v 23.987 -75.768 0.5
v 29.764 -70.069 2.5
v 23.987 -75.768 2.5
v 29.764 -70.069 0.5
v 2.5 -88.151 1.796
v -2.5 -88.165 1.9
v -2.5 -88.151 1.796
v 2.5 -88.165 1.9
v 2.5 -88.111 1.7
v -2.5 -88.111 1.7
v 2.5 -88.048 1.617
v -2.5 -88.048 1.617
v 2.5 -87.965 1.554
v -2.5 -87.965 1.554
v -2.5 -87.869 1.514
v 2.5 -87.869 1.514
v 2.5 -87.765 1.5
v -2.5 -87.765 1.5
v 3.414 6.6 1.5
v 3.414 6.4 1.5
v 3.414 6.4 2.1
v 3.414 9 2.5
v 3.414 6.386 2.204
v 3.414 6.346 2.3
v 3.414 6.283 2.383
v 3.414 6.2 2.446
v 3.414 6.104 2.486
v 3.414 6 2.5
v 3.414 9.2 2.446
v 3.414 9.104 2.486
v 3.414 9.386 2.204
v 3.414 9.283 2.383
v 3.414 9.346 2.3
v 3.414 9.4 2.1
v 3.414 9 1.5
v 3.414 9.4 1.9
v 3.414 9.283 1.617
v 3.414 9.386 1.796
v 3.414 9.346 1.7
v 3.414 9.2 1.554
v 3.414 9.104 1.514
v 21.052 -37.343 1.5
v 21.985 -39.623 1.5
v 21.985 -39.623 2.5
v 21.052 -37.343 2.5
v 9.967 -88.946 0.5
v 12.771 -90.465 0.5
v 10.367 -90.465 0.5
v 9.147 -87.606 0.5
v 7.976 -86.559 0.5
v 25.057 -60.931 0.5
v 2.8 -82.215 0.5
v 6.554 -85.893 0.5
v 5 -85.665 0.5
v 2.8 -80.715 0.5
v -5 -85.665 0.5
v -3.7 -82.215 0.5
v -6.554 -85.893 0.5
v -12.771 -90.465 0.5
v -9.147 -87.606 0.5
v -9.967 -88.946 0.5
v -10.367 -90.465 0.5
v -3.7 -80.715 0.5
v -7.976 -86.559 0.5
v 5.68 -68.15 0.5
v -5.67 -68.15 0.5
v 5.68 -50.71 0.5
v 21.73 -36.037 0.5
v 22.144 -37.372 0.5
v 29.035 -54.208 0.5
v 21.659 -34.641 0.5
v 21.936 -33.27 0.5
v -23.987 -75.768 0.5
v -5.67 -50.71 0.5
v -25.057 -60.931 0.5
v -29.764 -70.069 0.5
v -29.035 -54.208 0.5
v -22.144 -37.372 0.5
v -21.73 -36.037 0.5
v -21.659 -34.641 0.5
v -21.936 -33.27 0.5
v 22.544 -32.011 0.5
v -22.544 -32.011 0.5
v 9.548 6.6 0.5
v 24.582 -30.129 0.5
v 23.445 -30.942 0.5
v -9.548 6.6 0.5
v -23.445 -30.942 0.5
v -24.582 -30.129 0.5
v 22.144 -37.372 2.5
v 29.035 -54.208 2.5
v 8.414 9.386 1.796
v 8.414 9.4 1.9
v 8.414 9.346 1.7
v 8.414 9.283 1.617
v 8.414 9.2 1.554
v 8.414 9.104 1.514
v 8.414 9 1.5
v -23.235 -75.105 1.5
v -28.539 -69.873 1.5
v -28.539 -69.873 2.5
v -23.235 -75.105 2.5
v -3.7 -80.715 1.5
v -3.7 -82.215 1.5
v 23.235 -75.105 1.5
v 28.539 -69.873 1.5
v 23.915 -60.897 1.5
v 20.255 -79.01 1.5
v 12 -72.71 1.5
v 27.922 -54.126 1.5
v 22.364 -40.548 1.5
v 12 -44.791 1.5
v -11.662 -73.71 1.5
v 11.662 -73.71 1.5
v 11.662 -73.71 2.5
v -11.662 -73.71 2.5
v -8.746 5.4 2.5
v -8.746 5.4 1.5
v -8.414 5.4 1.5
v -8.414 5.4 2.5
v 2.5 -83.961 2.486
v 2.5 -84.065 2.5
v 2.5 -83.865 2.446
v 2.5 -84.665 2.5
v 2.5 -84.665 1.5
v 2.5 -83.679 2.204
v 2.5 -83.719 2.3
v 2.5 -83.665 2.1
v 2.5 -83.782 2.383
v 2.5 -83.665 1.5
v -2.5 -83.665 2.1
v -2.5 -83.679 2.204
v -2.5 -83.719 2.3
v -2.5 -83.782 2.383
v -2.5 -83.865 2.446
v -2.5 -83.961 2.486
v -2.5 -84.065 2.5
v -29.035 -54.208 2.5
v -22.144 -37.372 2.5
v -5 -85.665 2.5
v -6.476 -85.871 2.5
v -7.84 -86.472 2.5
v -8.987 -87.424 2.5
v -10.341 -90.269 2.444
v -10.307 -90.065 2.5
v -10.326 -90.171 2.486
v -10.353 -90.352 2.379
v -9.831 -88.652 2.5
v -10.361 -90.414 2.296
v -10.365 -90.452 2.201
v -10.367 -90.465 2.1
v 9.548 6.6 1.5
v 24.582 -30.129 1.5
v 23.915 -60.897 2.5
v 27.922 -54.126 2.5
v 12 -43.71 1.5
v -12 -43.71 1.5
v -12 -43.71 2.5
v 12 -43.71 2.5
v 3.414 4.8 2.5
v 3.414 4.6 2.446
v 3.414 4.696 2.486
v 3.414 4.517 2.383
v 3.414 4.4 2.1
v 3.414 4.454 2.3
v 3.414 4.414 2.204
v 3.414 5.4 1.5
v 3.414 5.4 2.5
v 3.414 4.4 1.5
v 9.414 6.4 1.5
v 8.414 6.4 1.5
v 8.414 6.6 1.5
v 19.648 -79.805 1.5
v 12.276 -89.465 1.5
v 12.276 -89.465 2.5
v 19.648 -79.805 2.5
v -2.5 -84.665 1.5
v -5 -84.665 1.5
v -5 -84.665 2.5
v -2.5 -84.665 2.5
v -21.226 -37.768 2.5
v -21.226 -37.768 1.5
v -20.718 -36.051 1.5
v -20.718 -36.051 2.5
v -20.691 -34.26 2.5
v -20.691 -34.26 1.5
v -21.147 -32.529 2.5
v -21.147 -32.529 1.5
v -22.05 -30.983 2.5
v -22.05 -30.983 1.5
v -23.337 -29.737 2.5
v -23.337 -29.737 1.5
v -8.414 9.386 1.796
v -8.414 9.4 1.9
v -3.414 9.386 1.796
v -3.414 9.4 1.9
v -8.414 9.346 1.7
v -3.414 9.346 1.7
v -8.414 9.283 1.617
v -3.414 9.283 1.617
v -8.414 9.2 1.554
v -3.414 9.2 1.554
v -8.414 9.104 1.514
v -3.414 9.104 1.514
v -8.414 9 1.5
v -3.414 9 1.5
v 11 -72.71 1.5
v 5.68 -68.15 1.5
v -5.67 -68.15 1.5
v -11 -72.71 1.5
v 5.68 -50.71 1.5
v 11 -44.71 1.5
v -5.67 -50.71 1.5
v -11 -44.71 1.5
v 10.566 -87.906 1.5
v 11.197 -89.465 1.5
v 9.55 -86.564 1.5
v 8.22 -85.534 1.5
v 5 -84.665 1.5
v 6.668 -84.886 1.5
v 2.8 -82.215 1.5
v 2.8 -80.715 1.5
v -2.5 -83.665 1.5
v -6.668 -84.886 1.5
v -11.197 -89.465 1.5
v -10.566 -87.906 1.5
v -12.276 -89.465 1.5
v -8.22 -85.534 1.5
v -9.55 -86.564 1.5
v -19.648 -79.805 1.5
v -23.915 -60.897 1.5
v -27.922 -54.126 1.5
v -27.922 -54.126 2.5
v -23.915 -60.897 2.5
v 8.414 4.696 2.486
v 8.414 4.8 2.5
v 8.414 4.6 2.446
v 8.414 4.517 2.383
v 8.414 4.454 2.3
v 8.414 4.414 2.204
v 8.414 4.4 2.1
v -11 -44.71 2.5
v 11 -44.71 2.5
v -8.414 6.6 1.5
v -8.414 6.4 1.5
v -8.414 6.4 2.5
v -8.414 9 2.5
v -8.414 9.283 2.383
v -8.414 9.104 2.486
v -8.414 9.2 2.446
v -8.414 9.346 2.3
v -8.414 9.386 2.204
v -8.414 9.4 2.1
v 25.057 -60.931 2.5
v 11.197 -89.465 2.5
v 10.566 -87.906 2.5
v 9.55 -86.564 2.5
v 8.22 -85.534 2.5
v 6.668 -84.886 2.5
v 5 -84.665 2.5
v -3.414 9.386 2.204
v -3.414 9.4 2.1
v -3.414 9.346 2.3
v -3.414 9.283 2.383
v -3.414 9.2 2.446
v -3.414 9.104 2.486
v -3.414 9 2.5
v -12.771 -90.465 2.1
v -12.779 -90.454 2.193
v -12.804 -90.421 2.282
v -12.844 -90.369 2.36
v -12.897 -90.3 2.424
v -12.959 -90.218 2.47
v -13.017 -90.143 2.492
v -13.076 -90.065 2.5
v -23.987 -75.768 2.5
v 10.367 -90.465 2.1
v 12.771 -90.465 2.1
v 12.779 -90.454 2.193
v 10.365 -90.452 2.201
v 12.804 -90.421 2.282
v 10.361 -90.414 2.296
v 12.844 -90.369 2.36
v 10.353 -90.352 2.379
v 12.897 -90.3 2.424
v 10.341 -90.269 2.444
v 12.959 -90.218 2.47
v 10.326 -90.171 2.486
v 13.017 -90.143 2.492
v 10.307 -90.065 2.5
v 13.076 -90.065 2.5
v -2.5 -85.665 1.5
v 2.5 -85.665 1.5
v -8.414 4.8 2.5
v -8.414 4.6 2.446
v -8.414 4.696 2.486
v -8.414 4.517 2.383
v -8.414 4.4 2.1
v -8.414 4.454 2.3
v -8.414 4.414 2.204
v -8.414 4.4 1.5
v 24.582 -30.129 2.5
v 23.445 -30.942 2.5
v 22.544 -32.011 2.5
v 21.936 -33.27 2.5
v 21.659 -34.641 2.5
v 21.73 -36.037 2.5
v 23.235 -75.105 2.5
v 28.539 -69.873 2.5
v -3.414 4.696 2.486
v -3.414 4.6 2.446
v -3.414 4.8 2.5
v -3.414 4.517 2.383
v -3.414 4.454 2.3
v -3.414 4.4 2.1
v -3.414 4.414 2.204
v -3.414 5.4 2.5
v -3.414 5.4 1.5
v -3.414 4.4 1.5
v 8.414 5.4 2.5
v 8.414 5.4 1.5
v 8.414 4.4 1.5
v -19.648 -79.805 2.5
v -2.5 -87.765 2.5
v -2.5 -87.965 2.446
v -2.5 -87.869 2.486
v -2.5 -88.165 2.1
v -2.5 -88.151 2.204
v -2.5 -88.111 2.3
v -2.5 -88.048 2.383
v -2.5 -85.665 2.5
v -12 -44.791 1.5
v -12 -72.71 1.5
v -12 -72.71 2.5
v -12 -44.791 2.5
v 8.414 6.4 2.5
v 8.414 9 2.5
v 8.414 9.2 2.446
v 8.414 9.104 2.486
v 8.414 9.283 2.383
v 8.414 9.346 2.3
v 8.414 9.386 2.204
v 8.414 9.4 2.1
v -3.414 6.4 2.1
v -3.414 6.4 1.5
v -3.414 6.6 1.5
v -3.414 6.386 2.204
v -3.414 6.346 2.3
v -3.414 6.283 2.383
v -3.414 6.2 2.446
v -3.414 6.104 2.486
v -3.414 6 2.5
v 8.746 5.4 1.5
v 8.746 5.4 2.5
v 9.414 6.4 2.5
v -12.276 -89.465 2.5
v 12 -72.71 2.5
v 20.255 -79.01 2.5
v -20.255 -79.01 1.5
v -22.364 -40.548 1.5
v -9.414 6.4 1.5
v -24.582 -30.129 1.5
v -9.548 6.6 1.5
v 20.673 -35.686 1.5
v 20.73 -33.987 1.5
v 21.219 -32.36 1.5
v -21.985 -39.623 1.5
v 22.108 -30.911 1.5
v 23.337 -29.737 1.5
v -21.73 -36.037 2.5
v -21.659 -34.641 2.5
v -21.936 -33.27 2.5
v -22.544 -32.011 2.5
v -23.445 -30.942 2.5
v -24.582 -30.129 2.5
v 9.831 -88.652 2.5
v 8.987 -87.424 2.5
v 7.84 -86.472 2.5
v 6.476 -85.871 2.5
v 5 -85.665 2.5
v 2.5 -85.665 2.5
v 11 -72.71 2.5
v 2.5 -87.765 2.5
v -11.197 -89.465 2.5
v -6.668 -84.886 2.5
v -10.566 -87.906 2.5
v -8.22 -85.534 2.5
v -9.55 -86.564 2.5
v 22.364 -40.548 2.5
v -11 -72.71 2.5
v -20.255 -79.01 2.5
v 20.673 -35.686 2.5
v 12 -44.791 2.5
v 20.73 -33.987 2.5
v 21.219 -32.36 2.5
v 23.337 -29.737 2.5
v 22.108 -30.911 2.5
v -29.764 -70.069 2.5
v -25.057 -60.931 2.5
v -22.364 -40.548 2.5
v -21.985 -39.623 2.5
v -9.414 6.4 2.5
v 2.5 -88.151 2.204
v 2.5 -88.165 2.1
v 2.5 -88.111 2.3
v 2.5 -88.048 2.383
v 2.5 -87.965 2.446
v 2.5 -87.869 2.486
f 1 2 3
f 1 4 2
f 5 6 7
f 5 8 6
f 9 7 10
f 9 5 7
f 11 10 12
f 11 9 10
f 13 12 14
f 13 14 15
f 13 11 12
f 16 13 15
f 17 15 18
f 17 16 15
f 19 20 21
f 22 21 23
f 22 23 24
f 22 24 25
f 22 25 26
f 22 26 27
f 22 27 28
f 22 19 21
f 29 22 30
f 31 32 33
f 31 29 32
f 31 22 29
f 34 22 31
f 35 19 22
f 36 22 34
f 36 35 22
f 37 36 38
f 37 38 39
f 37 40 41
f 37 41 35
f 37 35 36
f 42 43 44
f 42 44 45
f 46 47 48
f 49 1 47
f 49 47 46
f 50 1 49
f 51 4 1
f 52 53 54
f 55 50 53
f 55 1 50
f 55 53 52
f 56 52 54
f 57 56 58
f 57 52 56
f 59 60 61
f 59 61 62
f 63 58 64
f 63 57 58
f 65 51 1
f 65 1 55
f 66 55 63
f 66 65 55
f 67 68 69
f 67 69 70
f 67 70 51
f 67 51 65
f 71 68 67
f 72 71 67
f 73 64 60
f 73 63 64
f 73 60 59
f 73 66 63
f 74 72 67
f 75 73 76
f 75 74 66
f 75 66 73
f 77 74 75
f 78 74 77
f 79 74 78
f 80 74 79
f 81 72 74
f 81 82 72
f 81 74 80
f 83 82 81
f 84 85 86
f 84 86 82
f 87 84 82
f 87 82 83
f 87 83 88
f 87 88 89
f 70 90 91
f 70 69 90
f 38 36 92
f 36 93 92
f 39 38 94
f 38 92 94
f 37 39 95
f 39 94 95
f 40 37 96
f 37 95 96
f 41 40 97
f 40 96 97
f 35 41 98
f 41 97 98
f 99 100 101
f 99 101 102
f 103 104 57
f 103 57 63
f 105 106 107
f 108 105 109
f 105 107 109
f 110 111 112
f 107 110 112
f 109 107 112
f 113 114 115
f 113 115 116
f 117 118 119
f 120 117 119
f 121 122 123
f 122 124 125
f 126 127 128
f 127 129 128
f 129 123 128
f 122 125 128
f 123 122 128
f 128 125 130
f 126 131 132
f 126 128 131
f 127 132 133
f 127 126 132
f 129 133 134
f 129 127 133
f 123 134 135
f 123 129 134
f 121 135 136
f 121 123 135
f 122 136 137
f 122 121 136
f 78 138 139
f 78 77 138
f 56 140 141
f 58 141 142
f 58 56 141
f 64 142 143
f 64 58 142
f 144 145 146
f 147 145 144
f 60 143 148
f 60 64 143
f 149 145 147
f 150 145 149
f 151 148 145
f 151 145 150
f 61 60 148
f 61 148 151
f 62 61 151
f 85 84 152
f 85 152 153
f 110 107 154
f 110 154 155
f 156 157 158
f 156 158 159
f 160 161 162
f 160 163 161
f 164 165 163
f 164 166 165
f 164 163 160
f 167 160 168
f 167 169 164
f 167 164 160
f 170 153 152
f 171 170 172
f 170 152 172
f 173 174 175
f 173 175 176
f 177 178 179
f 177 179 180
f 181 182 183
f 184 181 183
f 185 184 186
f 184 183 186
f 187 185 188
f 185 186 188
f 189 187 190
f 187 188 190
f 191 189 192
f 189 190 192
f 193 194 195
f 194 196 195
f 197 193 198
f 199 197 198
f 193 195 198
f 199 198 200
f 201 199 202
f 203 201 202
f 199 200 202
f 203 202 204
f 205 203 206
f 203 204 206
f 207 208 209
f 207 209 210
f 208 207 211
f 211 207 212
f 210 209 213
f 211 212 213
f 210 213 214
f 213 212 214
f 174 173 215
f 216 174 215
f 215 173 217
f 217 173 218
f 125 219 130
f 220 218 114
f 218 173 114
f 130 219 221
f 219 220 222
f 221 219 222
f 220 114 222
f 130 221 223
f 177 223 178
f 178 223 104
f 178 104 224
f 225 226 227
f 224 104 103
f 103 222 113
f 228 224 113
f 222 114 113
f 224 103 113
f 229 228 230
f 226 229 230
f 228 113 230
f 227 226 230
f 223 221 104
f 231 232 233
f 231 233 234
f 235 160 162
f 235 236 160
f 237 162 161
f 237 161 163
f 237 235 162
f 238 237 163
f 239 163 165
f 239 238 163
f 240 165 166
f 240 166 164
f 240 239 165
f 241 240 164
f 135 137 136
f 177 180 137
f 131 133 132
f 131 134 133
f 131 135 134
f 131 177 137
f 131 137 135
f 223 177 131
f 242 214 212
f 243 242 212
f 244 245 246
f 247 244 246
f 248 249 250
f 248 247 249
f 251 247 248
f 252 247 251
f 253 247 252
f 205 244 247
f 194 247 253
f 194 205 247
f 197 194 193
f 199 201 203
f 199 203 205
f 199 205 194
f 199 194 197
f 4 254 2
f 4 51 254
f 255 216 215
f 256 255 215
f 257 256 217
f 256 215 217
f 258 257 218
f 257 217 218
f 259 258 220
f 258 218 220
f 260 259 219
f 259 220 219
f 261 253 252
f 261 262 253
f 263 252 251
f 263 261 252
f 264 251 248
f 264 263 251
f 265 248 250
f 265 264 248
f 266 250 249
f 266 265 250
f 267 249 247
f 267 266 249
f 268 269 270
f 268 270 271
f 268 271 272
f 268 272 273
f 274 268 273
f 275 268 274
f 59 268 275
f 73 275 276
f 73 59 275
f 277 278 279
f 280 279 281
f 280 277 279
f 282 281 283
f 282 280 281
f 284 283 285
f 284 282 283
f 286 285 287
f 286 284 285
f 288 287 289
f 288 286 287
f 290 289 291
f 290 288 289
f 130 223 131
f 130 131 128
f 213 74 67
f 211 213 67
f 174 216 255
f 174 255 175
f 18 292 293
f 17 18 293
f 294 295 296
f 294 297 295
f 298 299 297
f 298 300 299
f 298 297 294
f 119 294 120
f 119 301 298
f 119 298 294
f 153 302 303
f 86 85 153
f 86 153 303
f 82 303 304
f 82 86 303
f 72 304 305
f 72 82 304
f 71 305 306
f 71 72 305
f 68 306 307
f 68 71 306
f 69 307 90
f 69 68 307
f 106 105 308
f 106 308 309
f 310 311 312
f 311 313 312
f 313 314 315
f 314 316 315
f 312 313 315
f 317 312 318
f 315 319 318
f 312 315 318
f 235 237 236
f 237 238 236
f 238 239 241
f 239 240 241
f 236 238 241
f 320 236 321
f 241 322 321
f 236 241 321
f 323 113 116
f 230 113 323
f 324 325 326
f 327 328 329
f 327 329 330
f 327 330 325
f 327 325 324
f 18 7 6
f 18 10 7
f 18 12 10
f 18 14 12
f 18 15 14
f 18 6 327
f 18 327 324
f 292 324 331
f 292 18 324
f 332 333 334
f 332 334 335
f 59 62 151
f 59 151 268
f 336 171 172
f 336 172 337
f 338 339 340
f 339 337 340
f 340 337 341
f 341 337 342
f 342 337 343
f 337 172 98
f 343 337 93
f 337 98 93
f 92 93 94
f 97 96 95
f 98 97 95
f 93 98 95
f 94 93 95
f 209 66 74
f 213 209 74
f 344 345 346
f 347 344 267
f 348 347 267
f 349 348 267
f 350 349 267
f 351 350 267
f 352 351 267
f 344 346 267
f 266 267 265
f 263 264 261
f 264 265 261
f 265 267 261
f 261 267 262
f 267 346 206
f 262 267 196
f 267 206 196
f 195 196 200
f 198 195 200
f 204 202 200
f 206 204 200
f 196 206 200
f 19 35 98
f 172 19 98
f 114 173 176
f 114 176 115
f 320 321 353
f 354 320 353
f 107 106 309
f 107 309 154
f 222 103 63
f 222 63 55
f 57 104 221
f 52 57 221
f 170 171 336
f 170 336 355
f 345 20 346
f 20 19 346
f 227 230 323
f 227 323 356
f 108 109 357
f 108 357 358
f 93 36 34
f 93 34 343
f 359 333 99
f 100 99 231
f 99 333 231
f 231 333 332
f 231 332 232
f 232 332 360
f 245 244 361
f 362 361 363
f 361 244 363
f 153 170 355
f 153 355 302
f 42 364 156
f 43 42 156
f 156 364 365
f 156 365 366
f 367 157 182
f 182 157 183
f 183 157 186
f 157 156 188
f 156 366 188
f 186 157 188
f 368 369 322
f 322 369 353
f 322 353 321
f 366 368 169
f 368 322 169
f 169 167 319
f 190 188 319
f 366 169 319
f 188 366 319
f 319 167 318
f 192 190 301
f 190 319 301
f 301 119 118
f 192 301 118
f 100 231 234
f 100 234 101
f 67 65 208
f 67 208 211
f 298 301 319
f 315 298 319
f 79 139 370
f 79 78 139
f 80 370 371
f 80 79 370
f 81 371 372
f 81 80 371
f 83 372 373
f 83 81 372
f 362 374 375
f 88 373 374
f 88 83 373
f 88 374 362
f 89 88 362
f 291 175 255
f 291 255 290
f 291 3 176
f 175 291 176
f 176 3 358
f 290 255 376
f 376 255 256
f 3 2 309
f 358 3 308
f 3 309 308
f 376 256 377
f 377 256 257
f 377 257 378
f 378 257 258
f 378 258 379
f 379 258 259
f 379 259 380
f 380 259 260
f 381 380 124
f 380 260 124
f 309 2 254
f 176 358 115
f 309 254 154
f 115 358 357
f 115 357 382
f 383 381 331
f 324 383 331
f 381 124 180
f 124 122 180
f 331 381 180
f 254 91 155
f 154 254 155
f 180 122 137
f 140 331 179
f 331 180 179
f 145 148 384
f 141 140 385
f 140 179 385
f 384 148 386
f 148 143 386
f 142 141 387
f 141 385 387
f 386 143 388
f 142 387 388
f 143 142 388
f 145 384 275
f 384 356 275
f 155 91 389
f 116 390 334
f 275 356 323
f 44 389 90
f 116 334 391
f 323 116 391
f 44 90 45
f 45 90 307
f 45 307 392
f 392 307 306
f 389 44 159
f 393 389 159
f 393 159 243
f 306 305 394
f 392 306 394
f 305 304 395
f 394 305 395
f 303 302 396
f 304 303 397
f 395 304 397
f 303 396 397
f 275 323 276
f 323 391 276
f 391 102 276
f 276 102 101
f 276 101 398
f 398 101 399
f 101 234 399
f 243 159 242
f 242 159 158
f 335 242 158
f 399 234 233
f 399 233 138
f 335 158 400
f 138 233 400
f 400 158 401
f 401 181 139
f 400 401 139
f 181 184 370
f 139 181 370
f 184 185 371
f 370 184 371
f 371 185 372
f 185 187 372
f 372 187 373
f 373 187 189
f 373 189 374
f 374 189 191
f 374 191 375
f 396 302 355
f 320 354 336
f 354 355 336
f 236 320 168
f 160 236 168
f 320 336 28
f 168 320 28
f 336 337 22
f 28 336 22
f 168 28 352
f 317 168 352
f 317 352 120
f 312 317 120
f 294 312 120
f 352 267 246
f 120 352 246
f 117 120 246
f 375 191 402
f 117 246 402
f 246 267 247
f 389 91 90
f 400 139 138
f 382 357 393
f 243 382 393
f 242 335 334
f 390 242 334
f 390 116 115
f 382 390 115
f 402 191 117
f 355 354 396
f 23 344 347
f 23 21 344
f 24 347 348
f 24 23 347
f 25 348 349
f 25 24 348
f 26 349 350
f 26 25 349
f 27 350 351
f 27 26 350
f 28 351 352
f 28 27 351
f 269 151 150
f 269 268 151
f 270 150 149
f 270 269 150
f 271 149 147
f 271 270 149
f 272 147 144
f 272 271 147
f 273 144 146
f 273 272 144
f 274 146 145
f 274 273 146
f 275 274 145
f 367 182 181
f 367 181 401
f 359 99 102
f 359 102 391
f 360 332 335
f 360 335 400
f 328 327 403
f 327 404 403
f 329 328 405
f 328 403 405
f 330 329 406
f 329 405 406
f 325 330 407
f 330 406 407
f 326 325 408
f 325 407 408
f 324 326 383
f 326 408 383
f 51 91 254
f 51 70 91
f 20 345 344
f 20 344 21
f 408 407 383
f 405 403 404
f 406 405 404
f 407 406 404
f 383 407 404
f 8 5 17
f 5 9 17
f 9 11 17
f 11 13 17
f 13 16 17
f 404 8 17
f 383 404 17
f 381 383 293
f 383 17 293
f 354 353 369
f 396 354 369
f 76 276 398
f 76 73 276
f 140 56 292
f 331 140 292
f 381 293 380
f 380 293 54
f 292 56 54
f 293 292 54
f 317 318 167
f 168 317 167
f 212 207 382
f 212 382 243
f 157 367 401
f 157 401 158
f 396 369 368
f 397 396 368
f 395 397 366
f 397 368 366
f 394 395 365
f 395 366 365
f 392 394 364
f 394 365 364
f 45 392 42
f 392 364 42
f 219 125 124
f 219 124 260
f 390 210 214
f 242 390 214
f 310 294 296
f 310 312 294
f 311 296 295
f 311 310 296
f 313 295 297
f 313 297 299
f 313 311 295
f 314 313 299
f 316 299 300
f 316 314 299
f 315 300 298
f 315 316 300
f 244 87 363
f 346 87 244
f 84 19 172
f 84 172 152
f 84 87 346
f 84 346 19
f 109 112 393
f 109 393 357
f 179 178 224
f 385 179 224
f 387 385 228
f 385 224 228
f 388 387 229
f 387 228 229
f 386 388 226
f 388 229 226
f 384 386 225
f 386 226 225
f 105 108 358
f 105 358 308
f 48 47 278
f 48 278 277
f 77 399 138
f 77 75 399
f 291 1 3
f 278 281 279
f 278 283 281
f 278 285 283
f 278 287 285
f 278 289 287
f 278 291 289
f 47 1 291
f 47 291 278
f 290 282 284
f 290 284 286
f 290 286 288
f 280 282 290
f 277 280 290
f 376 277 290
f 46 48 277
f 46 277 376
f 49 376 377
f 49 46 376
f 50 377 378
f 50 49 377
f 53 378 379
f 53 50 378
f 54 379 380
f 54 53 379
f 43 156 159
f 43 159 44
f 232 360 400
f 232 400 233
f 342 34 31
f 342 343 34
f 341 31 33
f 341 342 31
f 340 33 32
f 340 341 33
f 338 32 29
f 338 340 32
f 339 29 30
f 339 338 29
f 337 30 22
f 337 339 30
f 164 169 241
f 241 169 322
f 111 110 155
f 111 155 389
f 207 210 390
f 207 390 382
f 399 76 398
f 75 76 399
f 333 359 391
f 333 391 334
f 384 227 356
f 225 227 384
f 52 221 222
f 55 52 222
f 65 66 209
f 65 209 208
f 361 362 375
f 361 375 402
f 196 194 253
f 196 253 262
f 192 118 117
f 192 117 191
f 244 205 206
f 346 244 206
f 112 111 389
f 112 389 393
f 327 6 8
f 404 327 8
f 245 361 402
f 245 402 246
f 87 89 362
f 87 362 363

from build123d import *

# Parameters (mm, degrees)
SKETCH070_W     = 11.35
SKETCH070_H     = 17.44
PAD008_DEPTH    = 1
SKETCH071_W     = 5
SKETCH071_H     = 5
SKETCH071_H_2   = 4.5
PAD009_DEPTH    = 1
SKETCH077_W     = 6.5
SKETCH077_H     = 1.5
POCKET030_DEPTH = 5
SKETCH090_W     = 22
SKETCH090_H     = 28
PAD021_DEPTH    = 1
FILLET016_R     = 0.4


with BuildPart() as part:
    # Sketch070 → Pad008 (new body)
    with BuildSketch(Plane.XY):
        with BuildLine():
            Line((-9.548198, 6.6), (9.548198, 6.6))
            Line((9.548198, 6.6), (24.582245, -30.129227))
            ThreePointArc((24.582245, -30.129227), (21.935707, -33.270294), (22.144365, -37.372358))
            Line((29.035486, -54.207849), (22.144365, -37.372358))
            Line((25.057074, -60.930809), (29.035486, -54.207849))
            Line((29.76445, -70.068592), (25.057074, -60.930809))
            Line((23.9869, -75.767923), (29.76445, -70.068592))
            Line((12.771037, -90.465016), (23.9869, -75.767923))
            Line((10.366563, -90.465016), (12.771037, -90.465016))
            ThreePointArc((10.366563, -90.465016), (8.6, -87.040094), (5, -85.665016))
            Line((-5, -85.665016), (5, -85.665016))
            ThreePointArc((-5, -85.665016), (-8.6, -87.040094), (-10.366563, -90.465016))
            Line((-12.771037, -90.465016), (-10.366563, -90.465016))
            Line((-23.9869, -75.767923), (-12.771037, -90.465016))
            Line((-29.76445, -70.068592), (-23.9869, -75.767923))
            Line((-25.057074, -60.930809), (-29.76445, -70.068592))
            Line((-29.035486, -54.207849), (-25.057074, -60.930809))
            Line((-22.144365, -37.372358), (-29.035486, -54.207849))
            ThreePointArc((-22.144365, -37.372358), (-21.935707, -33.270294), (-24.582245, -30.129227))
            Line((-24.582245, -30.129227), (-9.548198, 6.6))
        make_face()
        with Locations((0.005, -59.43)):
            Rectangle(SKETCH070_W, SKETCH070_H, mode=Mode.SUBTRACT)
    extrude(amount=PAD008_DEPTH)

    # Sketch071 (on Face26 of Pad008) → Pad009 (join)
    with BuildSketch(Plane.XY.offset(1)):
        with Locations((-5.913956, 6.9)):
            Rectangle(SKETCH071_W, SKETCH071_H)
        with Locations((5.913956, 6.9)):
            Rectangle(SKETCH071_W, SKETCH071_H)
        with Locations((0, -85.915016)):
            Rectangle(SKETCH071_W, SKETCH071_H_2)
    extrude(amount=PAD009_DEPTH)

    # Sketch077 (on Face5 of Pad009) → Pocket030 (cut)
    with BuildSketch(Plane.XY.offset(1)):
        with Locations((-0.45, -81.465016)):
            Rectangle(SKETCH077_W, SKETCH077_H)
    extrude(amount=-POCKET030_DEPTH, mode=Mode.SUBTRACT)

    # Sketch090 (on Face5 of Pocket030) → Pad021 (join)
    with BuildSketch(Plane.XY.offset(1)):
        with BuildLine():
            Line((-9.413956, 6.4), (9.413956, 6.4))
            Line((9.413956, 6.4), (24.582245, -30.129227))
            ThreePointArc((24.582245, -30.129227), (21.935707, -33.270294), (22.144365, -37.372358))
            Line((22.144365, -37.372358), (29.035486, -54.207849))
            Line((29.035486, -54.207849), (25.057074, -60.930809))
            Line((25.057074, -60.930809), (29.76445, -70.068592))
            Line((29.76445, -70.068592), (23.9869, -75.767923))
            Line((23.9869, -75.767923), (12.771037, -90.465016))
            Line((12.771037, -90.465016), (10.366563, -90.465016))
            ThreePointArc((10.366563, -90.465016), (8.6, -87.040094), (5, -85.665016))
            Line((-5, -85.665016), (5, -85.665016))
            ThreePointArc((-5, -85.665016), (-8.6, -87.040094), (-10.366563, -90.465016))
            Line((-10.366563, -90.465016), (-12.771037, -90.465016))
            Line((-12.771037, -90.465016), (-23.9869, -75.767923))
            Line((-23.9869, -75.767923), (-29.76445, -70.068592))
            Line((-29.76445, -70.068592), (-25.057074, -60.930809))
            Line((-25.057074, -60.930809), (-29.035486, -54.207849))
            Line((-29.035486, -54.207849), (-22.144365, -37.372358))
            ThreePointArc((-22.144365, -37.372358), (-21.935707, -33.270294), (-24.582245, -30.129227))
            Line((-24.582245, -30.129227), (-9.413956, 6.4))
        make_face()
        with BuildLine():
            Line((-8.746409, 5.4), (8.746409, 5.4))
            Line((8.746409, 5.4), (23.336592, -29.736995))
            ThreePointArc((23.336592, -29.736995), (20.922218, -33.157742), (21.051699, -37.342708))
            Line((21.985036, -39.622914), (21.051699, -37.342708))
            Line((12, -43.71), (21.985036, -39.622914))
            Line((-12, -43.71), (12, -43.71))
            Line((-21.985036, -39.622914), (-12, -43.71))
            Line((-21.225759, -37.767948), (-21.985036, -39.622914))
            ThreePointArc((-21.225759, -37.767948), (-20.859949, -33.37892), (-23.336592, -29.736995))
            Line((-8.746409, 5.4), (-23.336592, -29.736995))
        make_face(mode=Mode.SUBTRACT)
        Polygon((-27.921656, -54.126491), (-23.914923, -60.897309), (-28.538789, -69.872986), (-23.234585, -75.10538), (-20.25505, -79.009716), (-12, -72.71), (-12, -44.790529), (-22.363851, -40.548387), align=None, mode=Mode.SUBTRACT)
        with BuildLine():
            Line((12.276247, -89.465016), (19.648388, -79.804676))
            Line((19.648388, -79.804676), (11.662019, -73.71))
            Line((11.662019, -73.71), (-11.662019, -73.71))
            Line((-11.662019, -73.71), (-19.648388, -79.804676))
            Line((-19.648388, -79.804676), (-12.276247, -89.465016))
            Line((-12.276247, -89.465016), (-11.196773, -89.465016))
            ThreePointArc((-5, -84.665016), (-8.919184, -86.005372), (-11.196773, -89.465016))
            Line((-5, -84.665016), (5, -84.665016))
            ThreePointArc((11.196773, -89.465016), (8.919184, -86.005372), (5, -84.665016))
            Line((11.196773, -89.465016), (12.276247, -89.465016))
        make_face(mode=Mode.SUBTRACT)
        Polygon((23.234585, -75.10538), (28.538789, -69.872986), (23.914923, -60.897309), (27.921656, -54.126491), (22.363851, -40.548387), (12, -44.790529), (12, -72.71), (20.25505, -79.009716), align=None, mode=Mode.SUBTRACT)
        with Locations((0, -58.71)):
            Rectangle(SKETCH090_W, SKETCH090_H, mode=Mode.SUBTRACT)
    extrude(amount=PAD021_DEPTH)

    # Fillet016
    fillet016_edges = [part.edges().sort_by_distance(p)[0] for p in [
        (0, -88.165016, 2),
        (0, -88.165016, 1),
        (0, -83.665016, 2),
        (-5.913956, 4.4, 2),
        (5.913956, 4.4, 2),
        (5.913956, 9.4, 2),
        (-5.913956, 9.4, 2),
        (-5.913956, 9.4, 1),
        (5.913956, 9.4, 1),
        (-11.5688, -90.465016, 2),
        (11.5688, -90.465016, 2),
        (0, 6.4, 2),
    ]]
    fillet(fillet016_edges, radius=FILLET016_R)


with BuildPart() as part_1:
    # Body005 placement: moved
    add(part.part.moved(Location((0, 0, 0.5))))


solid = part_1.part
